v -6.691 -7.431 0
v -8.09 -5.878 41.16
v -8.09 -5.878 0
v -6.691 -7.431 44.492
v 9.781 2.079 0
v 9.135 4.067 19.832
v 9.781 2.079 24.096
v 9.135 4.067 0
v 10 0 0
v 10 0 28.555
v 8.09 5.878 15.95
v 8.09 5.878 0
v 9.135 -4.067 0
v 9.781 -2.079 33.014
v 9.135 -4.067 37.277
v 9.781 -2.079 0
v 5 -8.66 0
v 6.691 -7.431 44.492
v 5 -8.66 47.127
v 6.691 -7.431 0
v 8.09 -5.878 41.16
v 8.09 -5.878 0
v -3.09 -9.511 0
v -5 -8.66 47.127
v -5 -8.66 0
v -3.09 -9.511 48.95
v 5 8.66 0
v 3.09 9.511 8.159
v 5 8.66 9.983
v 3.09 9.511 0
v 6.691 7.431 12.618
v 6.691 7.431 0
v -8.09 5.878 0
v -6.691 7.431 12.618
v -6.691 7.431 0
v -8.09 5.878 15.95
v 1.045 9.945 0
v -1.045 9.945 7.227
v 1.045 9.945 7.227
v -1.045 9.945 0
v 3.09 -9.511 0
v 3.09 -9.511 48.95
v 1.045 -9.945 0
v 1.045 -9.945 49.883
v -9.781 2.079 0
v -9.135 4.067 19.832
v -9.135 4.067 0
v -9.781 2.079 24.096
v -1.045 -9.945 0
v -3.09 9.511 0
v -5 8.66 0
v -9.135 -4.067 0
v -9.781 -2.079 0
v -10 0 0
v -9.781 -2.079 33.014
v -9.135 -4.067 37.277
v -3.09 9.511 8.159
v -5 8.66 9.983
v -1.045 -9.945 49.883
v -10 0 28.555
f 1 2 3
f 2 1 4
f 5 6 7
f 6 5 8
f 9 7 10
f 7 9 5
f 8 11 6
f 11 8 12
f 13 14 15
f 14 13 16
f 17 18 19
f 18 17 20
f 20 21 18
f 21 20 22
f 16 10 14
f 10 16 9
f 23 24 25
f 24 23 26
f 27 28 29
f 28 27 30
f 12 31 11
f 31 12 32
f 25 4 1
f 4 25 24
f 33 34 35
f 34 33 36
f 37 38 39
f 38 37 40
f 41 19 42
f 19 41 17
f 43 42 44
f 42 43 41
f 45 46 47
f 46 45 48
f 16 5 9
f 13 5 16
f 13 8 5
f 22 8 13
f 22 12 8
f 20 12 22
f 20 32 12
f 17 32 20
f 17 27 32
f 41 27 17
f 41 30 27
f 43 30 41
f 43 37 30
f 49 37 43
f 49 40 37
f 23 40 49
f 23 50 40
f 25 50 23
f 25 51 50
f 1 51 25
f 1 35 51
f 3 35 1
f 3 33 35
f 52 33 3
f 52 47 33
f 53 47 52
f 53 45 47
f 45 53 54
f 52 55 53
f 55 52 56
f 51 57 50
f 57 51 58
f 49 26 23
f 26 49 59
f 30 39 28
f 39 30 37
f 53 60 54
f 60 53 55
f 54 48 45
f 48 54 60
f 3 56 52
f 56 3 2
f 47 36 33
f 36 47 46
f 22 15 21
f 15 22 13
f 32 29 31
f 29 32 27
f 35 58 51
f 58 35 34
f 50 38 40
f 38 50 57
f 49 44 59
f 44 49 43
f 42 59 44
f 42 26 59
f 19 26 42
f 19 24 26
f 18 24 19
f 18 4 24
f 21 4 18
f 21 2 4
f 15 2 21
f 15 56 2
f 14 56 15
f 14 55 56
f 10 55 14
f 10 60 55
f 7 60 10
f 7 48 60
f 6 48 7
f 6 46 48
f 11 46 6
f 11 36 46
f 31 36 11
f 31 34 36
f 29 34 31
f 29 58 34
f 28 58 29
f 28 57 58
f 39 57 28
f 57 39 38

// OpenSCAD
module column(height=50, radius=10, angle=25) {
    difference(){
        cylinder(h=height, r=radius);
        translate([-radius-0.001,radius,height-(radius*2*tan(90-angle))])
        rotate([angle,0,0])
        cube(height*2);
    }
}

column();
